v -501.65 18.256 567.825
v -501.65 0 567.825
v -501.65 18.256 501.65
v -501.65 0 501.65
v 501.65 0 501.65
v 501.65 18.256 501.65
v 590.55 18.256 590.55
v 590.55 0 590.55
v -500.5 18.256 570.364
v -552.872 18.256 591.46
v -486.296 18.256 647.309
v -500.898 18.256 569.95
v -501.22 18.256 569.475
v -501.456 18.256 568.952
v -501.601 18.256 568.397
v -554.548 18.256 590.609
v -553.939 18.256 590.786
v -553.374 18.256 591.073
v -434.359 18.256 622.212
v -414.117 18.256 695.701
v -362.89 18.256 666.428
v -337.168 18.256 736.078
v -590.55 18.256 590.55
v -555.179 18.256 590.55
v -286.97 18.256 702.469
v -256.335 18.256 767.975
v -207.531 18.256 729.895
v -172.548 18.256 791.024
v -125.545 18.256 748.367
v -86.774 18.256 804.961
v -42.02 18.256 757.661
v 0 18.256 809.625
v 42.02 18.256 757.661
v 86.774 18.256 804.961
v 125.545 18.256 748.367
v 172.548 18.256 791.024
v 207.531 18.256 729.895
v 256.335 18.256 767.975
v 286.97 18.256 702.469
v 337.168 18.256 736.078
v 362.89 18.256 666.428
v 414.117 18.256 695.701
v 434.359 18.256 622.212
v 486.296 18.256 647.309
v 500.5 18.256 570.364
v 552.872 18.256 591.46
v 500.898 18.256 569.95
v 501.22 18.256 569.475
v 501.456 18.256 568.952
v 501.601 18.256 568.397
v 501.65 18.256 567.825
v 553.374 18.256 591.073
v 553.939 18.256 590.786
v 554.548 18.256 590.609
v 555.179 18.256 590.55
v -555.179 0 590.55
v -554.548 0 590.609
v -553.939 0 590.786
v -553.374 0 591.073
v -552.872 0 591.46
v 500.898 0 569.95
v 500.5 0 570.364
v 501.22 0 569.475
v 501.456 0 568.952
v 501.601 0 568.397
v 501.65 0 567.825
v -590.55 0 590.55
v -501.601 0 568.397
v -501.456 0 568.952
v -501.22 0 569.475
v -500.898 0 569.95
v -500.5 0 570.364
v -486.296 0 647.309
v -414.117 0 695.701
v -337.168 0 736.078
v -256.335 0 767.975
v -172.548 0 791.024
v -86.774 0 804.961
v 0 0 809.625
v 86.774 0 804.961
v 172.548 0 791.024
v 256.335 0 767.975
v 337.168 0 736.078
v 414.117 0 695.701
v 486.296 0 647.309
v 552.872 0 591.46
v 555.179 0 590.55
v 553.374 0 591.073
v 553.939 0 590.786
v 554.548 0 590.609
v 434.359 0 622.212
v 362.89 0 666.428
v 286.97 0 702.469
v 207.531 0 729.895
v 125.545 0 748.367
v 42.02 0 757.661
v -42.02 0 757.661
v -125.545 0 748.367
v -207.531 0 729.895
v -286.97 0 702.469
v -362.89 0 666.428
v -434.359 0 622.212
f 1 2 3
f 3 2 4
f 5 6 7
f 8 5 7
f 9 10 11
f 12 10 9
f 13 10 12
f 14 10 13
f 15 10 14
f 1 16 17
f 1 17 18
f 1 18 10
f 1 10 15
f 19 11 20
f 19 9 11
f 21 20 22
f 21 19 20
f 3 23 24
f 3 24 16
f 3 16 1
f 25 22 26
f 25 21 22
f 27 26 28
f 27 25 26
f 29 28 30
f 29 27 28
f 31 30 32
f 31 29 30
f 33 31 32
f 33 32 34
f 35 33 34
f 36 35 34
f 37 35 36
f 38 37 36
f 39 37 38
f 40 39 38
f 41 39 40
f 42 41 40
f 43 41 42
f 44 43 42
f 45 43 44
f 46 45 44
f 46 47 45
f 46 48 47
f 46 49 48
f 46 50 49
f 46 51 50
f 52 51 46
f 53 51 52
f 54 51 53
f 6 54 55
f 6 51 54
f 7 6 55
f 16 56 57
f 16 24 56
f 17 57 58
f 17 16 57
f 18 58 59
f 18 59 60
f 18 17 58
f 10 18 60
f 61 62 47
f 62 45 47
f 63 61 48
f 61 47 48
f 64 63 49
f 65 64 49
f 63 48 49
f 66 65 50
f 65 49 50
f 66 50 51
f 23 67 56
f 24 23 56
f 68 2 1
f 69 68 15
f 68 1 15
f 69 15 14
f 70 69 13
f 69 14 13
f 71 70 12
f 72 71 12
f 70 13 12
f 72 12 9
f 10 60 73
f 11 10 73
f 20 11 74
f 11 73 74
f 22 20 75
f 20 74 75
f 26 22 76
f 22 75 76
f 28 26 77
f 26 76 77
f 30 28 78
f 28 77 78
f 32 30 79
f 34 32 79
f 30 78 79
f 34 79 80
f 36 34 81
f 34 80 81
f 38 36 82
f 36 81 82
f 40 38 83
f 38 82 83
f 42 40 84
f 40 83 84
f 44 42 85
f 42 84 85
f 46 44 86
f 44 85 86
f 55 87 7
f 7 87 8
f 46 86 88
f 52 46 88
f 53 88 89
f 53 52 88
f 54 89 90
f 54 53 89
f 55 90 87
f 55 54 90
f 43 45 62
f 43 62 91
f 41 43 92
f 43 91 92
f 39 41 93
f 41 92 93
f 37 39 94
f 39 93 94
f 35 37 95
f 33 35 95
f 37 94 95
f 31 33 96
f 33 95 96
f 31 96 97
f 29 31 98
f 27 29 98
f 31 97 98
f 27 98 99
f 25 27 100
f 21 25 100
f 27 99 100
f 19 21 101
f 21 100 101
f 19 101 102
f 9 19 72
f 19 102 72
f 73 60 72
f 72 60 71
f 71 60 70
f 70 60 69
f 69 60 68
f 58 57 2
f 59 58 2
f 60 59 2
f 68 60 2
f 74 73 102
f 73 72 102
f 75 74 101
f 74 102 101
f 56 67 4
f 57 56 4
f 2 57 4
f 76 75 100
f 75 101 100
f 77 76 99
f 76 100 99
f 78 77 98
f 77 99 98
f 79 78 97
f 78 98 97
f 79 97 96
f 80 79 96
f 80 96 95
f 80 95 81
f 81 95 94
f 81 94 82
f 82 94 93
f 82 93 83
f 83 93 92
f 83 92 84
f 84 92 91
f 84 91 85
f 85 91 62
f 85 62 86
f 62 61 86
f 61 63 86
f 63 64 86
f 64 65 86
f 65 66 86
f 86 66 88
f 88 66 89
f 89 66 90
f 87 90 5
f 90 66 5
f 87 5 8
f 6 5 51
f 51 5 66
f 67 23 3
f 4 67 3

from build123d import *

# Parameters (mm, degrees)
BOSS_EXTRUDE1_DEPTH = 18.25625
SKETCH4_W           = 88.9
SKETCH4_H           = 88.9
BOSS_EXTRUDE2_DEPTH = 18.25625
CUT_EXTRUDE1_DEPTH  = 1003.285006268
FILLET1_R           = 3.3782


with BuildPart() as part:
    # Sketch3 → Boss-Extrude1 (new body)
    with BuildSketch(Plane(origin=(0, 0, 0), x_dir=(1, 0, 0), z_dir=(0, 1, 0))):
        with BuildLine():
            Line((-501.65, -501.65), (-590.55, -590.55))
            Line((-590.55, -590.55), (-553.84414606, -590.55))
            ThreePointArc((-553.84414606, -590.55), (0, -809.625), (553.84414606, -590.55))
            Line((553.84414606, -590.55), (590.55, -590.55))
            Line((590.55, -590.55), (501.65, -501.65))
            Line((501.65, -501.65), (501.65, -569.352841501))
            ThreePointArc((501.65, -569.352841501), (0, -758.825), (-501.65, -569.352841501))
            Line((-501.65, -569.352841501), (-501.65, -501.65))
        make_face()
    extrude(amount=BOSS_EXTRUDE1_DEPTH)

    # Sketch4 → Boss-Extrude2 (add)
    with BuildSketch(Plane(origin=(0, 18.25625, 0), x_dir=(1, 0, 0), z_dir=(0, 1, 0))):
        with Locations((-546.1, -546.1)):
            Rectangle(SKETCH4_W, SKETCH4_H)
        with Locations((546.1, -546.1)):
            Rectangle(SKETCH4_W, SKETCH4_H)
    extrude(amount=-BOSS_EXTRUDE2_DEPTH)

    # Sketch5 → Cut-Extrude1 (cut, through all)
    with BuildSketch(Plane(origin=(0, 18.25625, 0), x_dir=(1, 0, 0), z_dir=(0, 1, 0))):
        Polygon((-590.55, -590.55), (-501.65, -501.65), (-590.55, -501.65), align=None)
        Polygon((501.65, -501.65), (590.55, -590.55), (590.55, -501.65), align=None)
    extrude(amount=-CUT_EXTRUDE1_DEPTH, mode=Mode.SUBTRACT)

    # Fillet1
    fillet1_edges = [part.edges().sort_by_distance(p)[0] for p in [
        (-501.65, 9.128125, 569.352841501),
        (501.65, 9.128125, 569.352841501),
        (553.84414606, 9.128125, 590.55),
        (-553.84414606, 9.128125, 590.55),
    ]]
    fillet(fillet1_edges, radius=FILLET1_R)


solid = part.part
